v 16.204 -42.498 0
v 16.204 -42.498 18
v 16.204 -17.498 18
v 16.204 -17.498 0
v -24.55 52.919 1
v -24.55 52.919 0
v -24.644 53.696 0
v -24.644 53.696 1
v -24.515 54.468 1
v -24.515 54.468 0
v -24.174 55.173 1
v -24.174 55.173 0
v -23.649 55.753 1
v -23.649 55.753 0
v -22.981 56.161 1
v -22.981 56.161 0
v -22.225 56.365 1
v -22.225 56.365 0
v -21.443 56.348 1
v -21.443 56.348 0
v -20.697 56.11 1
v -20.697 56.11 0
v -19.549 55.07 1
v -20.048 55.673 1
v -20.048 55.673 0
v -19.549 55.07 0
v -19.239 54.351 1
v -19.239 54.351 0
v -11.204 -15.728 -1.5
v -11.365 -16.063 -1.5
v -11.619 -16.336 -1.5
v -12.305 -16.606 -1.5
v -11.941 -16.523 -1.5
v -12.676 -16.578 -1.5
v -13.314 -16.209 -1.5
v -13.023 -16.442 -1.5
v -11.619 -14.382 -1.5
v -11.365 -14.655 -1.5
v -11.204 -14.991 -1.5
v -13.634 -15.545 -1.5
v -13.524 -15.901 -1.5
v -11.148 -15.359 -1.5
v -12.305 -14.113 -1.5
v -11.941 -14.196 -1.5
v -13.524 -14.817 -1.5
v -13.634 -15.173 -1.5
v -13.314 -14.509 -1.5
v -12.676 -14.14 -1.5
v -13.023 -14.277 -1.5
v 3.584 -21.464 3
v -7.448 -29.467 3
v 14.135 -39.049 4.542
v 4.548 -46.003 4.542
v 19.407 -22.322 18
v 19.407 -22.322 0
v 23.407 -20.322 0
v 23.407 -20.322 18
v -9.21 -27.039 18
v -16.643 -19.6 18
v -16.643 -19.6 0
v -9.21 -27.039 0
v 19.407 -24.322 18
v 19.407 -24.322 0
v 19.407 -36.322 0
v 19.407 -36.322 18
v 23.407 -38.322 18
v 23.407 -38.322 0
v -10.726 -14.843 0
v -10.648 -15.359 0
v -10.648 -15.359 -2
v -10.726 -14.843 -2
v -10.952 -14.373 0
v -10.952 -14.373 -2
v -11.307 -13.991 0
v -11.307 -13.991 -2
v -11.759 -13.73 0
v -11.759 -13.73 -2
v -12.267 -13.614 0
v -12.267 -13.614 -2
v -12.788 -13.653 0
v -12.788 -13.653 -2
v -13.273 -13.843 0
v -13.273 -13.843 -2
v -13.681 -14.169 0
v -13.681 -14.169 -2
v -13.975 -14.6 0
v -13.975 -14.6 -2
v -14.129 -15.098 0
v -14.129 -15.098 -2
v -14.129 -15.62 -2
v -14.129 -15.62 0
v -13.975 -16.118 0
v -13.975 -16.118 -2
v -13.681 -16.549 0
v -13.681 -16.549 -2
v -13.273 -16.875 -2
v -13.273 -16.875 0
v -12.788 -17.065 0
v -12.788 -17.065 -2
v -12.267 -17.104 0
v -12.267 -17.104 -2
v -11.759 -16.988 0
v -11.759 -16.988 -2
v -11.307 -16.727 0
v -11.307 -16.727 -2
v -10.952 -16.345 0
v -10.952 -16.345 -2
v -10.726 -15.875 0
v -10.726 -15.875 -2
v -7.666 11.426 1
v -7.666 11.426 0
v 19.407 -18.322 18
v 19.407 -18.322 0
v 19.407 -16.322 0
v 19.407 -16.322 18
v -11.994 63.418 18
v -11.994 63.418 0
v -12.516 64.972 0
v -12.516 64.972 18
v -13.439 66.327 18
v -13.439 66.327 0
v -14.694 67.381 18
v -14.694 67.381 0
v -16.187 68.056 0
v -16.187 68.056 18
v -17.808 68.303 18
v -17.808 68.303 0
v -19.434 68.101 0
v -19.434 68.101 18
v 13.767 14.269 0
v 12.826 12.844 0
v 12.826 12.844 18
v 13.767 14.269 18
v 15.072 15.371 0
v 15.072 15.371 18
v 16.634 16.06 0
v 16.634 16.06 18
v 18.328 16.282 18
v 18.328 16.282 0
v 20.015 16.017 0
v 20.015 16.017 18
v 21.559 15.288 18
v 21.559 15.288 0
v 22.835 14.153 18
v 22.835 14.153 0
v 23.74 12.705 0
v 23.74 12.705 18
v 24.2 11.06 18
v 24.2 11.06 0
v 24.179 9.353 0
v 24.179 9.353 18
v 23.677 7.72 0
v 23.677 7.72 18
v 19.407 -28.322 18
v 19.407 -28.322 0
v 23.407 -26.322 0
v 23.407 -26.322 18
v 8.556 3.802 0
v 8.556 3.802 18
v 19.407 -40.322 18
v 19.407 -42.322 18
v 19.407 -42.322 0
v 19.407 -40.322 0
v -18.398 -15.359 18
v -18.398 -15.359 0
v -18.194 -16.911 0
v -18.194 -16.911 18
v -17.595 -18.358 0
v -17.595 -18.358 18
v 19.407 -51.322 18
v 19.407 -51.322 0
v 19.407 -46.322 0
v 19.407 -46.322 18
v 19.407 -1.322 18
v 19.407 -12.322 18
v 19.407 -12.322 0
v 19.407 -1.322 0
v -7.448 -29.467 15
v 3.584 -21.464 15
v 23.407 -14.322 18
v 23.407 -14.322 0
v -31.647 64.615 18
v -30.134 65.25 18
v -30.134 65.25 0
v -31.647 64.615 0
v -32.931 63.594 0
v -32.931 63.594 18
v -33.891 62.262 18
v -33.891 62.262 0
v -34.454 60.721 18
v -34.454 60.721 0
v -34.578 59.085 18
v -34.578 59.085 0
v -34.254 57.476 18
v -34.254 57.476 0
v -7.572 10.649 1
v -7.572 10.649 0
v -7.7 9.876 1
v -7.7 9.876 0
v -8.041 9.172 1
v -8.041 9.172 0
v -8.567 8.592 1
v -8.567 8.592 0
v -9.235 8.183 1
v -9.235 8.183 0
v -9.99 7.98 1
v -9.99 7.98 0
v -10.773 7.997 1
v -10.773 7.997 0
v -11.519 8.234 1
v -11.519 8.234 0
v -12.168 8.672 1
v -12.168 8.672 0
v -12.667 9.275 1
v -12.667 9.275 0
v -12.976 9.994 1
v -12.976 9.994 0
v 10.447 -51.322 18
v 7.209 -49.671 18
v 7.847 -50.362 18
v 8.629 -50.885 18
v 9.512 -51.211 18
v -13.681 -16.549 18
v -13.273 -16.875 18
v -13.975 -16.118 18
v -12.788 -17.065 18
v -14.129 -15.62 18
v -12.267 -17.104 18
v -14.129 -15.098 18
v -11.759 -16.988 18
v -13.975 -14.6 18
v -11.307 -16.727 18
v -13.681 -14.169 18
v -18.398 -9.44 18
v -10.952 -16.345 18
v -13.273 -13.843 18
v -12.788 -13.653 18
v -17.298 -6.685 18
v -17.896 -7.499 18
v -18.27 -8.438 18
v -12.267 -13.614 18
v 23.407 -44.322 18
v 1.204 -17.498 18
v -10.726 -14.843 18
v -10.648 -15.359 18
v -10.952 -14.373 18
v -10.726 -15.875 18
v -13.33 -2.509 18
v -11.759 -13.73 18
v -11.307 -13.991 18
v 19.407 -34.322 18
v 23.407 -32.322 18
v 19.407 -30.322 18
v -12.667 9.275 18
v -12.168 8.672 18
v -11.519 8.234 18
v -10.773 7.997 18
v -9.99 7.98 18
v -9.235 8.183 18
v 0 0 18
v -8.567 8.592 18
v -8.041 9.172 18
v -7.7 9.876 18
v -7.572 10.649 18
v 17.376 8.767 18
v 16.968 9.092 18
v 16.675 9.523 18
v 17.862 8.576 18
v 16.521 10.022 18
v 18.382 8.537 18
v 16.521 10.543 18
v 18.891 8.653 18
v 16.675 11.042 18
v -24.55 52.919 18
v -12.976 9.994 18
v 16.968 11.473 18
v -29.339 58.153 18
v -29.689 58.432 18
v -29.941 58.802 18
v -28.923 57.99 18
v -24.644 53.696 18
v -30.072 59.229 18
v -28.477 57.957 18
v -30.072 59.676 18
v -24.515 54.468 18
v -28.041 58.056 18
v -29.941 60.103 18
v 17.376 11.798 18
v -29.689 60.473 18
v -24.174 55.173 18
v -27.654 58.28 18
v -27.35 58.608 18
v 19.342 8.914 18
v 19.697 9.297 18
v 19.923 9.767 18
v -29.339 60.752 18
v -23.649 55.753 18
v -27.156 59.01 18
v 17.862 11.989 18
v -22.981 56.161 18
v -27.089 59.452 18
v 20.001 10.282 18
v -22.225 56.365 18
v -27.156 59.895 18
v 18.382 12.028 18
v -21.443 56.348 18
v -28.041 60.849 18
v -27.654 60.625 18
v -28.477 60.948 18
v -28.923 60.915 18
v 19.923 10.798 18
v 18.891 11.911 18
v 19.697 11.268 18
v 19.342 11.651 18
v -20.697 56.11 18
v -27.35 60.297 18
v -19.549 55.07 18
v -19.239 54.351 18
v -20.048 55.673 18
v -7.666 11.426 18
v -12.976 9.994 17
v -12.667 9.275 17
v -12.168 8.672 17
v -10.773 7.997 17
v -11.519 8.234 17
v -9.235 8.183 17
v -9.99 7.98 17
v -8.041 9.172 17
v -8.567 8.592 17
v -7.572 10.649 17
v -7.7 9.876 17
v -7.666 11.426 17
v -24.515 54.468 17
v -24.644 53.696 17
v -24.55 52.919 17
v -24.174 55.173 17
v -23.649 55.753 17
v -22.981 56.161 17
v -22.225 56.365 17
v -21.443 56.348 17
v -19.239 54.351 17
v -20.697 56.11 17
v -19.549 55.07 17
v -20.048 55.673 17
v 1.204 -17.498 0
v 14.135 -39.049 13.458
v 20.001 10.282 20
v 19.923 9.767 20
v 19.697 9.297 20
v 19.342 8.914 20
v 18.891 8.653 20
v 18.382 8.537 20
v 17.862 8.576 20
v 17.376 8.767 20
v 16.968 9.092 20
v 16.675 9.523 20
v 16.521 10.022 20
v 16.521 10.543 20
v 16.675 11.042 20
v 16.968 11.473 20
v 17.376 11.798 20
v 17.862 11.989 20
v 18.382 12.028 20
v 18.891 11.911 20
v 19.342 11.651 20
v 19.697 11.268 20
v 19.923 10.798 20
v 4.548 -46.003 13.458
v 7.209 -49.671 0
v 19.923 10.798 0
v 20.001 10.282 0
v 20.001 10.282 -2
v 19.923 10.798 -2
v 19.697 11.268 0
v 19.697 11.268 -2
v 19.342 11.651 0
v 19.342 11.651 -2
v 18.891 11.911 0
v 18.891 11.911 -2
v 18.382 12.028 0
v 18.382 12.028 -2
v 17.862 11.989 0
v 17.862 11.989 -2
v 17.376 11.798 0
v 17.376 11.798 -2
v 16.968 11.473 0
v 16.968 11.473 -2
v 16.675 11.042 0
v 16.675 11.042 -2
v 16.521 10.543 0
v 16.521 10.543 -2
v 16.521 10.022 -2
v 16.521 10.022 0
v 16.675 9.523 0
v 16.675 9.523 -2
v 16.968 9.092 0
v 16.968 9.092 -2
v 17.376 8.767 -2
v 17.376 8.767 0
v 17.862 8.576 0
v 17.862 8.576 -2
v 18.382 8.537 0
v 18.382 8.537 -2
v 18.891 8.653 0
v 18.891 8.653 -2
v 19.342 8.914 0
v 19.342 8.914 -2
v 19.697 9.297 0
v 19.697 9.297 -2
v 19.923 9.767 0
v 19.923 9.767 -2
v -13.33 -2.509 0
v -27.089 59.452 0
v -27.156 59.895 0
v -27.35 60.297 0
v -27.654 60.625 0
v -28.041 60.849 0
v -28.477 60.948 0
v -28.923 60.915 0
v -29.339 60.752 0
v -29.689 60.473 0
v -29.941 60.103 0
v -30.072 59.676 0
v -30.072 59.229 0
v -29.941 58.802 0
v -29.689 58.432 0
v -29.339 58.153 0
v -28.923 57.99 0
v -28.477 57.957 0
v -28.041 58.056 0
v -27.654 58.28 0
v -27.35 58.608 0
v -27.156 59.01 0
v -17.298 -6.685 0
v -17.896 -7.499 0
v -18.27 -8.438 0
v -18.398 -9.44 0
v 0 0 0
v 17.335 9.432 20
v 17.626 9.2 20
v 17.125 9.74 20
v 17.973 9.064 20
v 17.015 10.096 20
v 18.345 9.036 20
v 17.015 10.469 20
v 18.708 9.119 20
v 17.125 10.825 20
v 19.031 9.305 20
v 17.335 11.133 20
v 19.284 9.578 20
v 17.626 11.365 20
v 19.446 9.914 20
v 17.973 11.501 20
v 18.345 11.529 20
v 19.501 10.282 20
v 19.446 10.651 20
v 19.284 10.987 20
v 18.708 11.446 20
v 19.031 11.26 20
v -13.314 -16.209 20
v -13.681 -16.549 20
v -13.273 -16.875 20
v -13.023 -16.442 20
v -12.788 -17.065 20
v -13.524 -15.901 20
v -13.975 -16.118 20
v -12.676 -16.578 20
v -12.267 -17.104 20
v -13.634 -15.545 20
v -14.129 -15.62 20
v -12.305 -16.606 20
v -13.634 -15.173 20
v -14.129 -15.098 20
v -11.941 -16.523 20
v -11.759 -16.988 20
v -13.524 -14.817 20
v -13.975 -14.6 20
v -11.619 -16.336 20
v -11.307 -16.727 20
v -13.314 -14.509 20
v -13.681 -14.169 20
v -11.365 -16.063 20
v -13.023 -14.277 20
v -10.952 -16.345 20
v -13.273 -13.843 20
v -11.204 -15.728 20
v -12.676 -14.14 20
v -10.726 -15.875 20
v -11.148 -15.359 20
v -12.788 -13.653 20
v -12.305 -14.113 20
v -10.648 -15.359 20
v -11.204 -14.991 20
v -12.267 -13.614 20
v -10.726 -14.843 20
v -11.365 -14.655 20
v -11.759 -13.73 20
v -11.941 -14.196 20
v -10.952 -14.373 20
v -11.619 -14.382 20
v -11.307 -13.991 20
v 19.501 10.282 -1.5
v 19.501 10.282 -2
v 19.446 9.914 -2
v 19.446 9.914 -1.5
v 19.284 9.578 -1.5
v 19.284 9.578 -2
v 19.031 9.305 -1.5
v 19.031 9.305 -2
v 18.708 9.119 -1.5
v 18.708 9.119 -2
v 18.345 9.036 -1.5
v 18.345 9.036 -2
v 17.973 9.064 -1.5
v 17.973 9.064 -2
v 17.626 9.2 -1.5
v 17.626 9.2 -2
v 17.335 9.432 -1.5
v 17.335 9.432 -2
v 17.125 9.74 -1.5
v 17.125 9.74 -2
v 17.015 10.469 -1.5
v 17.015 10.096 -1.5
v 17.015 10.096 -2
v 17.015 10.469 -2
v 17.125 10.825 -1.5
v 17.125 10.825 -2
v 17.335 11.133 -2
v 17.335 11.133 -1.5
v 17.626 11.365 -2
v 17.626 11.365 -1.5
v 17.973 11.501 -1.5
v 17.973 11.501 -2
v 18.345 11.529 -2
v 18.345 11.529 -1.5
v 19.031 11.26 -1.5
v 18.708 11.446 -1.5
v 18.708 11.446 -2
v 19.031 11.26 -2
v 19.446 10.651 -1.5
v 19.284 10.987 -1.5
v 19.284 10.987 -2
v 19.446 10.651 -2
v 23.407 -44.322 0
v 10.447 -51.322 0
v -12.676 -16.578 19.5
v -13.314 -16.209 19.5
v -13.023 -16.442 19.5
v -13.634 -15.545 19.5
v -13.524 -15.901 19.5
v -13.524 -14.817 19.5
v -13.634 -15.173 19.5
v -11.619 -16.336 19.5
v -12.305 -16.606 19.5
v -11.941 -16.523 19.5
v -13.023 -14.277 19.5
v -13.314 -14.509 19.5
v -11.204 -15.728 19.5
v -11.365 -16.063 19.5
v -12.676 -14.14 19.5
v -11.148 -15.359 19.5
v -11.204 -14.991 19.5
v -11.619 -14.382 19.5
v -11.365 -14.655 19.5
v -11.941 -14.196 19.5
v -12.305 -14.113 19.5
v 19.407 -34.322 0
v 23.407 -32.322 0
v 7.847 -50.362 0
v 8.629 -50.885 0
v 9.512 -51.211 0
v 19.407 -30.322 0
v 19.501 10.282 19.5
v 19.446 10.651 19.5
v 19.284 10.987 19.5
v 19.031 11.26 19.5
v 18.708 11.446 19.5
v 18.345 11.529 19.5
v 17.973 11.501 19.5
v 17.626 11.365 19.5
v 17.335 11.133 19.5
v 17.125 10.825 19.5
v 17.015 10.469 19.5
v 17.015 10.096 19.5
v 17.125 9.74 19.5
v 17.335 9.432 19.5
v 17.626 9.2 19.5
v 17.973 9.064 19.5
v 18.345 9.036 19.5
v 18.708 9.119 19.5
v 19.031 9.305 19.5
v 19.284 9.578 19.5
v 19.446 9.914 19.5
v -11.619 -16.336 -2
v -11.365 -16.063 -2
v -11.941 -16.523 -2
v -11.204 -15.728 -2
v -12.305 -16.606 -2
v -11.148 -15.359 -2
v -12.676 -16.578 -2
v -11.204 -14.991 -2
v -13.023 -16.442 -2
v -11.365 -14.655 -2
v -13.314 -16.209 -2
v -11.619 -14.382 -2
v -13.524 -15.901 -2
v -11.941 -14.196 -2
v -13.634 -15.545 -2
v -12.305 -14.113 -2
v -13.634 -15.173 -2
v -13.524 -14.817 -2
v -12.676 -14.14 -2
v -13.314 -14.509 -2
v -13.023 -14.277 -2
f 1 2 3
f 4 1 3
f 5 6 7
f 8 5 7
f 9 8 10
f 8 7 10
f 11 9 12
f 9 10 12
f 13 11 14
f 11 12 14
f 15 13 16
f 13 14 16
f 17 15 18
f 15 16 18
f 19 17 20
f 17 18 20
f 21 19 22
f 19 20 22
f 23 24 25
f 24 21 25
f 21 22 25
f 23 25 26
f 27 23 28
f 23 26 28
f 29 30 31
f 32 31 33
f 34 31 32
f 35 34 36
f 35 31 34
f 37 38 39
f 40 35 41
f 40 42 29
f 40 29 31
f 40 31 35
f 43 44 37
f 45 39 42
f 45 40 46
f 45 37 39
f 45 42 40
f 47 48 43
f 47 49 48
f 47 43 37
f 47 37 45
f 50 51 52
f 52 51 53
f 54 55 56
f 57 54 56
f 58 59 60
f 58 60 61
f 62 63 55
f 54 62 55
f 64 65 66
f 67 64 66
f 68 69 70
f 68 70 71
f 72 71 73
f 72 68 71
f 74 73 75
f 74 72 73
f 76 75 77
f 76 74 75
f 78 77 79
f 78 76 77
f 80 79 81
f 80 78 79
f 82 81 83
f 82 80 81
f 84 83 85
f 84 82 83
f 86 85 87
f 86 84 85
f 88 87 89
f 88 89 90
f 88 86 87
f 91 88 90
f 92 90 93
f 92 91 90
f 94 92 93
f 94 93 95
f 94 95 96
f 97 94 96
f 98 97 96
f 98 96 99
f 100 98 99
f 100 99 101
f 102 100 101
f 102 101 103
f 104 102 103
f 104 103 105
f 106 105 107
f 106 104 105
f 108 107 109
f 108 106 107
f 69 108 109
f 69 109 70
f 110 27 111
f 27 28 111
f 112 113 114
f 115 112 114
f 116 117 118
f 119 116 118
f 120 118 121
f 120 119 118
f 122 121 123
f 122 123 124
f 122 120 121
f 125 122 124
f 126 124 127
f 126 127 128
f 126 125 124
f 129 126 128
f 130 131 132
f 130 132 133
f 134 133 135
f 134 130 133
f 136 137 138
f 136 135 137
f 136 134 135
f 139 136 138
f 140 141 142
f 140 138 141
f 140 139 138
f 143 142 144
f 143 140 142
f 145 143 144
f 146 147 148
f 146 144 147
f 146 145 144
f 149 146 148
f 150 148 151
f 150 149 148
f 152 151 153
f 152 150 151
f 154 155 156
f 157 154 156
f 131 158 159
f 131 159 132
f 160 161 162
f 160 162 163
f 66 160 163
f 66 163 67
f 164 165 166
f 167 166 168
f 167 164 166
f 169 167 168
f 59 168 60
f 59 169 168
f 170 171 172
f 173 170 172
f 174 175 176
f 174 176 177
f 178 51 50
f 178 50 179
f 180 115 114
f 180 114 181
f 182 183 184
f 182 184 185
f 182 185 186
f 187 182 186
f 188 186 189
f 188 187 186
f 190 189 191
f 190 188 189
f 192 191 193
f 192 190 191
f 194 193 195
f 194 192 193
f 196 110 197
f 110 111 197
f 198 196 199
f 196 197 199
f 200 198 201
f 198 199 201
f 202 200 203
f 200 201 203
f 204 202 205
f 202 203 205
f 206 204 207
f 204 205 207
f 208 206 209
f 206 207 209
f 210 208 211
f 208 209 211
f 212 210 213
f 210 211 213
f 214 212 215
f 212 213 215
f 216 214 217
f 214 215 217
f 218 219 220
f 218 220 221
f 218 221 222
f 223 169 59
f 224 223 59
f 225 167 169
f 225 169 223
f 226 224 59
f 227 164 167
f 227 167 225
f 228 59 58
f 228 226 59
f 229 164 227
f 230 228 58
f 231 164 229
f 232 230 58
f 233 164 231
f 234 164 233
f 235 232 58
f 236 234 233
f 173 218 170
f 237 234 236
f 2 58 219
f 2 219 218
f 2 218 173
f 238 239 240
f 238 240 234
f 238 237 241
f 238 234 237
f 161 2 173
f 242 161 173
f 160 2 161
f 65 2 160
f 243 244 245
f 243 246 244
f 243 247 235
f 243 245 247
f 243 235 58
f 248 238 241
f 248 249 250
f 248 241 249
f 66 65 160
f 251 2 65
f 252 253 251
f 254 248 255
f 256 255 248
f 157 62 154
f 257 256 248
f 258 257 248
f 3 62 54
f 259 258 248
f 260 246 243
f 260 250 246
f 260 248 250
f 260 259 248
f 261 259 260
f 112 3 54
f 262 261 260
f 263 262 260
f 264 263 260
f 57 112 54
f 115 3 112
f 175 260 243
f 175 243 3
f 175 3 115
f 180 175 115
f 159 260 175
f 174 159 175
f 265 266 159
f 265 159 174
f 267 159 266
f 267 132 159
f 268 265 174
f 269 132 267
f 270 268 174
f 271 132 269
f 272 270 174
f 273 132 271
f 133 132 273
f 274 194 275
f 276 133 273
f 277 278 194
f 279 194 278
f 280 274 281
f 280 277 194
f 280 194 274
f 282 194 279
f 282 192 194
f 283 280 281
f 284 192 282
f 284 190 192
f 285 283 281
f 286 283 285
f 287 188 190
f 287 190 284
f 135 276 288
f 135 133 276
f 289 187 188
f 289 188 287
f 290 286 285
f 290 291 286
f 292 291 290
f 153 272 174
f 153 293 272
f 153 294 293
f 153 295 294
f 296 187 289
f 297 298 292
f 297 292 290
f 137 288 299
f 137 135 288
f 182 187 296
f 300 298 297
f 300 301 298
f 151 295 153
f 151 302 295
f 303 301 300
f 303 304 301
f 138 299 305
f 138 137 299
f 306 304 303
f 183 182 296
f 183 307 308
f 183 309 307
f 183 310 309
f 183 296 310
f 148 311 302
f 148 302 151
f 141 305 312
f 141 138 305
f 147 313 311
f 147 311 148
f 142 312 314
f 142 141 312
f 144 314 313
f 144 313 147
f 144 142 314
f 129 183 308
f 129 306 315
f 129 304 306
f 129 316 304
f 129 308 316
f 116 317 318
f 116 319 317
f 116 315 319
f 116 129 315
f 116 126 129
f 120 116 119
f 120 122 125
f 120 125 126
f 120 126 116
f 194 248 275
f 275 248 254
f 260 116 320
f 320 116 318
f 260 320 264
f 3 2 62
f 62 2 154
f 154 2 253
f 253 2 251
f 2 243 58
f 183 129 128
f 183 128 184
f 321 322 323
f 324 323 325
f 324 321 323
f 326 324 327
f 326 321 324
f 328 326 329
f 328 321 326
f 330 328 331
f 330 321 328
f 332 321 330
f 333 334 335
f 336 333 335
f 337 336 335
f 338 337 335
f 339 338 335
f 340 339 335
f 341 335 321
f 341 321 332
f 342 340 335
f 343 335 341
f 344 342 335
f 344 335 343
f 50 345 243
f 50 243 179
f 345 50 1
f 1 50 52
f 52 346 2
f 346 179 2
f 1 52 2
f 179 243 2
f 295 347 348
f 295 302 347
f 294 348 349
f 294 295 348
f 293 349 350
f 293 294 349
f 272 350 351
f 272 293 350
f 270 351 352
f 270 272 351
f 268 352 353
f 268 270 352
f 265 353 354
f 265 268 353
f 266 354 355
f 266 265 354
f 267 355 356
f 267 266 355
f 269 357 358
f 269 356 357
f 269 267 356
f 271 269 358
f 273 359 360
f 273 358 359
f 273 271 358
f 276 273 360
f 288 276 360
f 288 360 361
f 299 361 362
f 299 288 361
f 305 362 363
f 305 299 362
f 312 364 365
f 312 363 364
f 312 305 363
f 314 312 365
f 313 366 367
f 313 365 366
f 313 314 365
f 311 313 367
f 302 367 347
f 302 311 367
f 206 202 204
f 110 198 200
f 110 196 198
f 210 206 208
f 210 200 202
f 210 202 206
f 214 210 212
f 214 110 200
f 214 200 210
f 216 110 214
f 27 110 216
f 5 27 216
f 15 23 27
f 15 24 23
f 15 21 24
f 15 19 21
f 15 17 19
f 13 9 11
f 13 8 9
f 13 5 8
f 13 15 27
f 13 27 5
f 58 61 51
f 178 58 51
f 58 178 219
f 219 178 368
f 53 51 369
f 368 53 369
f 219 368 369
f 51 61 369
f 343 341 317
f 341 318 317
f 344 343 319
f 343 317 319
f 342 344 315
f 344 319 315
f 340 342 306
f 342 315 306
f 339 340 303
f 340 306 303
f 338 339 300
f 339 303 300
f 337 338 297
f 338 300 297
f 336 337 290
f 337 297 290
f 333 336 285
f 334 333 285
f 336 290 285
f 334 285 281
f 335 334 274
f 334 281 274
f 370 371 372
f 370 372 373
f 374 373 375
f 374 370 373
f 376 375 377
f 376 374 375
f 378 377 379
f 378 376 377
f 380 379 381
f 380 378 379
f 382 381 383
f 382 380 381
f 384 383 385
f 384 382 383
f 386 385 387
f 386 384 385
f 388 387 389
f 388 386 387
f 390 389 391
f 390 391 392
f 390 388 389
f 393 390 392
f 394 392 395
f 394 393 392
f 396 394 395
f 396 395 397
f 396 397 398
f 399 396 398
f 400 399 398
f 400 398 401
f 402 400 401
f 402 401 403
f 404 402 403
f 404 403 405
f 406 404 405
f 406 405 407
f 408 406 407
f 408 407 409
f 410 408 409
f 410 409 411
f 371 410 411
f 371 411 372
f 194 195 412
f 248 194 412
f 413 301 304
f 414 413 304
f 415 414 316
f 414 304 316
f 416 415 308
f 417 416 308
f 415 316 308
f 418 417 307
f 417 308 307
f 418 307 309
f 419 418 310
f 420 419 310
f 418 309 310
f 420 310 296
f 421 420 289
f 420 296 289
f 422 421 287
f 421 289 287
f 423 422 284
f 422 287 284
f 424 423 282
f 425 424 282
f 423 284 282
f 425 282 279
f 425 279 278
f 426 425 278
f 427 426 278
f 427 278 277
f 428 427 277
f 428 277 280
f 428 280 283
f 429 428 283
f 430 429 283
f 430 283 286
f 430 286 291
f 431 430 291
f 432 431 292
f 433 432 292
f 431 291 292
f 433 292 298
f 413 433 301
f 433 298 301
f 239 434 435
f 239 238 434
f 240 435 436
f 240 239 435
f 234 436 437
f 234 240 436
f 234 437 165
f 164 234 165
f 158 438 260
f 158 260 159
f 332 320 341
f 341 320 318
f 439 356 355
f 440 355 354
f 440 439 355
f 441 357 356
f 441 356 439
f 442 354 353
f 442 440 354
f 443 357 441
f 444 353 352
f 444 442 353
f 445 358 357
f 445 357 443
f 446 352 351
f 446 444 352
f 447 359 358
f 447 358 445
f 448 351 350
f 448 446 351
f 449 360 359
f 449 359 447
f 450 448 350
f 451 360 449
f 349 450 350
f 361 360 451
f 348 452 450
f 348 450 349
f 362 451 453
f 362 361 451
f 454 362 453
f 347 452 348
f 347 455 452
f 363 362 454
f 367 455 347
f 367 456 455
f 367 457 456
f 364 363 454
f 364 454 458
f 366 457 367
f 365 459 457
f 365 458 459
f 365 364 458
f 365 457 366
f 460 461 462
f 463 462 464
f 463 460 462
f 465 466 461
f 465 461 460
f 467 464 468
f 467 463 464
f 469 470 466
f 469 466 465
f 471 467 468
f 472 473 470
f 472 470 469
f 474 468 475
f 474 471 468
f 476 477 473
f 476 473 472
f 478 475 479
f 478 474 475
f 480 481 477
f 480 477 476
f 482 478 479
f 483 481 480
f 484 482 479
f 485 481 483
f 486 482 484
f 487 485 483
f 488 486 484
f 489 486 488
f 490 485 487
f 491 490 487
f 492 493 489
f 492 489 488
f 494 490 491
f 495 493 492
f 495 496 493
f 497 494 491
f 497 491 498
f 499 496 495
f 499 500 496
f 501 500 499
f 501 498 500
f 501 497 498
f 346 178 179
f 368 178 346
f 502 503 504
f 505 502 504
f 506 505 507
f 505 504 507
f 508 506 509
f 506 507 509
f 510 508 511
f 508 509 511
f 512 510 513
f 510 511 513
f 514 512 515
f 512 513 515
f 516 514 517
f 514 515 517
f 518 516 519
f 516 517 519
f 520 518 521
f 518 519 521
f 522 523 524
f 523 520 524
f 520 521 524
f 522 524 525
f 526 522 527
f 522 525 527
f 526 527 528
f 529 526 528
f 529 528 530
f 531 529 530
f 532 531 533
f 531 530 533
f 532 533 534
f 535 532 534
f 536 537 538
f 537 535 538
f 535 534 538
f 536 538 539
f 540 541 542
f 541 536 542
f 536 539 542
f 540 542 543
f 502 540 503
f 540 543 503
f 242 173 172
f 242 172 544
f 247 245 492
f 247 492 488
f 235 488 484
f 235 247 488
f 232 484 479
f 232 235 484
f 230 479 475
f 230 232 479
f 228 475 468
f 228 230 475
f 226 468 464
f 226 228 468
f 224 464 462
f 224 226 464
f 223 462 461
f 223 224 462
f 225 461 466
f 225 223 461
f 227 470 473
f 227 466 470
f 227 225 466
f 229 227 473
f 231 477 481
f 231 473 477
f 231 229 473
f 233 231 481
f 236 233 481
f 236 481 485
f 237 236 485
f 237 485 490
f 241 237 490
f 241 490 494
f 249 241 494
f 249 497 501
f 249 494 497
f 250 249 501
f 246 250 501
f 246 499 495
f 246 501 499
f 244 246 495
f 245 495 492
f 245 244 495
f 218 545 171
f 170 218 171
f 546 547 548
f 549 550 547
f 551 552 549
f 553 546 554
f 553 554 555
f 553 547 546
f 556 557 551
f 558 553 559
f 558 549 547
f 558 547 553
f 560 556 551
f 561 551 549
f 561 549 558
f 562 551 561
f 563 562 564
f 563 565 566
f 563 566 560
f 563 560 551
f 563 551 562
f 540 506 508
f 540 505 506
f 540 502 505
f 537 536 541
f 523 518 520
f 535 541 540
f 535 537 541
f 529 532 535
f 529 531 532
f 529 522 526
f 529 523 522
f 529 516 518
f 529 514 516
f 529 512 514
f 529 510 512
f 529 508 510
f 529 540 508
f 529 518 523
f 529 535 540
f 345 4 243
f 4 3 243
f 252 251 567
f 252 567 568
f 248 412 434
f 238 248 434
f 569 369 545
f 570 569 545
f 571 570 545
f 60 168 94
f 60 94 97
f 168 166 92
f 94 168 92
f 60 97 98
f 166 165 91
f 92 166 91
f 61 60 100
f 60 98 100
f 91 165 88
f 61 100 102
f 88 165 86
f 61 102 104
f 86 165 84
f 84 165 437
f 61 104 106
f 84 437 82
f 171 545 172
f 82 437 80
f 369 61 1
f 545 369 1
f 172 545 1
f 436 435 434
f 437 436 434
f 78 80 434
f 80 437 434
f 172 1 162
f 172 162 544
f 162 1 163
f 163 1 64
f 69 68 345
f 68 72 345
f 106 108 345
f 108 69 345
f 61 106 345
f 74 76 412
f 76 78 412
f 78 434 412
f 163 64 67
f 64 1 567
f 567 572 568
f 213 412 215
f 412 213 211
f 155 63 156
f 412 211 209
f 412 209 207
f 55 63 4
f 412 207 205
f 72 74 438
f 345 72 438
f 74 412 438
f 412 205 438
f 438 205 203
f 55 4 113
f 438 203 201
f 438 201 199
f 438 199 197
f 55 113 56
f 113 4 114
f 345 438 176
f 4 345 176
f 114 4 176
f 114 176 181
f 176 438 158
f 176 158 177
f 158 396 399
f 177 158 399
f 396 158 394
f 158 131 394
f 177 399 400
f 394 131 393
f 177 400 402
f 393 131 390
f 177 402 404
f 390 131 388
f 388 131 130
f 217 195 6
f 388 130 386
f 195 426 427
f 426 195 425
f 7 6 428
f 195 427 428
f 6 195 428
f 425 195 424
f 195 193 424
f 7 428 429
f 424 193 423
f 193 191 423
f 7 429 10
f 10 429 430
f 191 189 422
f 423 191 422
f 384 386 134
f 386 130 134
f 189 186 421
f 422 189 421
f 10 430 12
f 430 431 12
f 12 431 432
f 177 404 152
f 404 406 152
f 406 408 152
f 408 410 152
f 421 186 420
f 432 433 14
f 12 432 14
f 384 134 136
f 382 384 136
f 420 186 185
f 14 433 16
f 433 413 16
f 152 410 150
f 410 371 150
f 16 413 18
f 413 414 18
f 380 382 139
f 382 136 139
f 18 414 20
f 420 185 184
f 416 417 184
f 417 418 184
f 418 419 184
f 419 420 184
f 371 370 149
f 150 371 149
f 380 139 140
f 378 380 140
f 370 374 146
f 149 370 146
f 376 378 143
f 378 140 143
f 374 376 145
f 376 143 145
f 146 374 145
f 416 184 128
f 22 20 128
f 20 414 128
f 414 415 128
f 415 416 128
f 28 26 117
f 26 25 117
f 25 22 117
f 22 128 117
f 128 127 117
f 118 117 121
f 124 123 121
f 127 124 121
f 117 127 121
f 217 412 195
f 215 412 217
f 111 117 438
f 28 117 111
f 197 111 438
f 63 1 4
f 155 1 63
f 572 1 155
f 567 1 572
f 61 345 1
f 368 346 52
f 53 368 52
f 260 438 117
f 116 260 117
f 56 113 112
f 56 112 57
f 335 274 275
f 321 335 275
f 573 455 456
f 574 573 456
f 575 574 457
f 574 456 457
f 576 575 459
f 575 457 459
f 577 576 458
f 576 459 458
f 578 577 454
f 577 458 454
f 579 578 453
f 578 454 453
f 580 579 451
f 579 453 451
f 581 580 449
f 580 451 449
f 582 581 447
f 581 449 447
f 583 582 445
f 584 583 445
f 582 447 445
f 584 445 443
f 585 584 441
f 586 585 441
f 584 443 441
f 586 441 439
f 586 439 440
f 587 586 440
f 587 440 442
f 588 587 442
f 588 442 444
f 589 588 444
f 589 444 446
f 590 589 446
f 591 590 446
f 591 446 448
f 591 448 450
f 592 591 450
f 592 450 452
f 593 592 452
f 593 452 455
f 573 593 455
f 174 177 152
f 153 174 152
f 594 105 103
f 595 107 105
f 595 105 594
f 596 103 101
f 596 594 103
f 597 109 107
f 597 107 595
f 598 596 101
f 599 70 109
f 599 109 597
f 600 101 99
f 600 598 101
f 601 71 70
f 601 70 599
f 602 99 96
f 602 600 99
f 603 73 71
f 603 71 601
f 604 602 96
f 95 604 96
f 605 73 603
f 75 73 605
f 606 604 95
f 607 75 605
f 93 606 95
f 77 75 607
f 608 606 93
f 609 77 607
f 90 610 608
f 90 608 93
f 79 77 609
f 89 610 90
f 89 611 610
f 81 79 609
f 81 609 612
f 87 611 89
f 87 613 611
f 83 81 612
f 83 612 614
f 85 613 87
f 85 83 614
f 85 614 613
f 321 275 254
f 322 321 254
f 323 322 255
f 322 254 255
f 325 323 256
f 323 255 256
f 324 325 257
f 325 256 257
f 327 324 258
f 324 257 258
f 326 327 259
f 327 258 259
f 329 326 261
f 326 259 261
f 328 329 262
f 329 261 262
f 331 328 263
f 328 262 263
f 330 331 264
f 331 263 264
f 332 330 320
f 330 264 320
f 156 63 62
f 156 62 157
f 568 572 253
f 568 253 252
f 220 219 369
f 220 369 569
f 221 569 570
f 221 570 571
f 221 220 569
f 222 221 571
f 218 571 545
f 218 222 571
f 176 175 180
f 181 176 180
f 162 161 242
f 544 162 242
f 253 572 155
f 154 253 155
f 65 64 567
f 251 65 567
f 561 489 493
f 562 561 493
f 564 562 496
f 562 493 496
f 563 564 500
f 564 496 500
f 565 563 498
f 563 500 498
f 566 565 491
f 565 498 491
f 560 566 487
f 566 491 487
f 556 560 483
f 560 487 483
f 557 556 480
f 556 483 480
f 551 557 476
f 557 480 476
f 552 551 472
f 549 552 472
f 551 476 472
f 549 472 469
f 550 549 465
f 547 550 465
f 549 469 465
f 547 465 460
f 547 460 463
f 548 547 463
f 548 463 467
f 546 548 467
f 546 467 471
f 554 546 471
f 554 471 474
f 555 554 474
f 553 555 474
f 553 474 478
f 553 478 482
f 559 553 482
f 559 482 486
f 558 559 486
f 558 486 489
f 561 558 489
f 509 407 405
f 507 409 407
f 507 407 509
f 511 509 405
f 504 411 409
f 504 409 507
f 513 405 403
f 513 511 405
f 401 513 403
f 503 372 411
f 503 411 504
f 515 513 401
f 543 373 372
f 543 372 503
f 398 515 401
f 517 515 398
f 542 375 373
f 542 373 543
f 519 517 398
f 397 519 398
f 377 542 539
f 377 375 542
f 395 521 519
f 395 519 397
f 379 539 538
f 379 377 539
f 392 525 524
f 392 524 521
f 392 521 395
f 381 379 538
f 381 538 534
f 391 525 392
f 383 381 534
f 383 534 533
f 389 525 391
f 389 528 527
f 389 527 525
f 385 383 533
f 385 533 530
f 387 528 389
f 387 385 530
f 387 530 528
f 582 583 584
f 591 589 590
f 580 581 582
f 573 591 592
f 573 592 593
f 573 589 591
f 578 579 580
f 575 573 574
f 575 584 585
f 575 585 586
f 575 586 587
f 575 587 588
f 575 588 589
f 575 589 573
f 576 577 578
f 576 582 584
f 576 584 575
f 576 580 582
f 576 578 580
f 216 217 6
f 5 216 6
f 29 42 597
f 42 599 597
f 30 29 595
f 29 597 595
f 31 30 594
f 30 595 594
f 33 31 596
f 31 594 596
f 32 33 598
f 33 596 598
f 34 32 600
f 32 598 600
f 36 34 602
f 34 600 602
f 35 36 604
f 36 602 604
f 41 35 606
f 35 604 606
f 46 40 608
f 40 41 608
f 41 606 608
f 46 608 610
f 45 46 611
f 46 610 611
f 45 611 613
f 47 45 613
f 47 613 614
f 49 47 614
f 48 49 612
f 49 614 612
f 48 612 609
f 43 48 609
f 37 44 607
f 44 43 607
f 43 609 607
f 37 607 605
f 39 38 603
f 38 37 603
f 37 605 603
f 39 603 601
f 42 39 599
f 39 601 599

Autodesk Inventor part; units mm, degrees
ref_plane "YZ Plane" through (0, 0, 0) normal (1, 0, 0) x (0, 1, 0)
ref_plane "XZ Plane" through (0, 0, 0) normal (0, 1, 0) x (-1, 0, 0)
sketch "Sketch1" plane through (0, 0, 0) normal (0, 0, 1) x (1, 0, 0)
  line L0 (0, 0) -> (-13.1942, 69.7633)
  line L1 (-13.1942, 69.7633) -> (-36.3853, 63.5848)
  line L2 (-36.3853, 63.5848) -> (-13.3296, -2.5093)
  line L3 (-13.3296, -2.5093) -> (-18.3981, -7.8428)
  line L4 (-18.3981, -7.8428) -> (-18.3981, -17.8428)
  line L5 (-18.3981, -17.8428) -> (-9.2098, -27.0392)
  line L6 (-9.2098, -27.0392) -> (8.4067, -51.3221)
  line L7 (8.4067, -51.3221) -> (19.4067, -51.3221)
  line L8 (19.4067, -51.3221) -> (19.4067, -1.3221)
  line L9 (19.4067, -1.3221) -> (23.6767, 7.7205)
  arc A0 (23.6767, 7.7205) -> (12.8256, 12.8444) centre (18.2512, 10.2824) ccw
  line L10 (8.5557, 3.8018) -> (12.8256, 12.8444)
  line L11 (0, 0) -> (8.5557, 3.8018)
  dimension "d0" = 71
  dimension "d1" = 24
  dimension "d2" = 70
  dimension "d3" = 20
  dimension "d4" = 10
  dimension "d5" = 13
  dimension "d6" = 30
  dimension "d8" = 11
  dimension "d9" = 50
  dimension "d10" = 10
  dimension "d11" = 12
  dimension "d12" = 10
extrude "Extrusion1" add sketch "Sketch1" along normal blind 18
sketch "Sketch2" plane through (0, 0, 18) normal (0, 0, 1) x (1, 0, 0)
  line L0 (16.2045, -42.4982) -> (16.2045, -17.4982)
  line L1 (16.2045, -17.4982) -> (1.2045, -17.4982)
  line L2 (1.2045, -17.4982) -> (16.2045, -42.4982)
  point P0 (0, 0)
  dimension "d15" = 25
  dimension "d16" = 15
extrude "Extrusion2" cut sketch "Sketch2" against normal blind 18
sketch "Sketch3" plane through (0, 0, 18) normal (0, 0, 1) x (1, 0, 0)
  line L0 (19.4067, -51.3221) -> (19.4067, -1.3221) construction
  line L1 (19.4067, -51.3221) -> (19.4067, -46.3221) construction
  line L2 (19.4067, -46.3221) -> (19.4067, -42.3221)
  line L3 (19.4067, -44.3221) -> (23.4067, -44.3221) construction
  line L4 (19.4067, -42.3221) -> (23.4067, -44.3221)
  line L5 (19.4067, -46.3221) -> (23.4067, -44.3221)
  point P0 (0, 0)
  dimension "d19" = 5
  dimension "d20" = 4
  dimension "d21" = 4
extrude "Extrusion3" add sketch "Sketch3" against normal blind 18
pattern_linear "Rectangular Pattern1" count 6 spacing 6 along (0, 1, 0) of "Extrusion3"
fillet "Fillet1" radius 6 3 edges at (-18.3981, -17.8428, 9) (-36.3853, 63.5848, 9) (-13.1942, 69.7633, 9)
fillet "Fillet2" radius 4 2 edges at (-18.3981, -7.8428, 9) (8.4067, -51.3221, 9)
sketch "Sketch5" plane through (0, 0, 18) normal (0, 0, 1) x (1, 0, 0)
  arc A0 (-30.1339, 65.2503) -> (-34.2545, 57.4763) centre (-28.5892, 59.4525) ccw projected
  circle A1 centre (-28.5892, 59.4525) radius 1.5
  point P0 (0, 0)
  dimension "d32" = 3
extrude "Extrusion5" cut sketch "Sketch5" against normal blind 18
sketch "Sketch6" plane through (-9.2098, -27.0392, 0) normal (-0.8094, -0.5872, 0) x (0, 0, 1)
  line L0 (3, -3) -> (15, -3)
  line L1 (0, 0) -> (0, -27.9601) projected
  line L2 (18, 0) -> (18, -27.9601) projected
  line L3 (0, 0) -> (18, 0) projected
  line L4 (3, -3) -> (4.5418, -23.4291)
  line L5 (18, -23.4291) -> (0, -23.4291) projected
  line L6 (15, -3) -> (13.4582, -23.4291)
  point P0 (0, 16.4781)
  dimension "d35" = 3
  dimension "d36" = 3
  dimension "d37" = 3
extrude "Extrusion6" cut sketch "Sketch6" against normal blind 14 contours L0 L6 L5 L4
sketch "Sketch7" plane through (0, 0, 18) normal (0, 0, 1) x (1, 0, 0)
  arc A0 (-18.3981, -15.359) -> (-16.6426, -19.5998) centre (-12.3981, -15.359) ccw projected
  circle A1 centre (-12.3981, -15.359) radius 1.75
  arc A2 (23.6767, 7.7205) -> (12.8256, 12.8444) centre (18.2512, 10.2824) ccw projected
  circle A3 centre (18.2512, 10.2824) radius 1.75
  point P0 (0, 0)
  dimension "d40" = 3.5
  dimension "d41" = 3.5
extrude "Extrusion7" add sketch "Sketch7" along normal blind 2
sketch "Sketch9" plane through (18.2512, 10.2824, 20) normal (0, 0, 1) x (1, 0, 0)
  circle A0 centre (0, 0) radius 1.75 projected
  circle A1 centre (-30.6493, -25.6415) radius 1.75 projected
  circle A2 centre (0, 0) radius 1.25
  circle A3 centre (-30.6493, -25.6415) radius 1.25
  point P0 (-18.2512, -10.2824)
  dimension "d44" = 0.5
  dimension "d45" = 0.5
extrude "Extrusion8" cut sketch "Sketch9" against normal blind 0.5 contours A2 | A3
sketch "Sketch10" plane through (0, 0, 18) normal (0, 0, 1) x (1, 0, 0)
  line L0 (-21.8945, 53.635) -> (-10.3211, 10.7097) construction
  line L1 (-24.5497, 52.9192) -> (-12.9763, 9.9938)
  line L2 (-7.6659, 11.4256) -> (-19.2393, 54.3509)
  arc A0 (-19.2393, 54.3509) -> (-24.5497, 52.9192) centre (-21.8945, 53.635) ccw
  arc A1 (-12.9763, 9.9938) -> (-7.6659, 11.4256) centre (-10.3211, 10.7097) ccw
  point P0 (0, 0)
  point P1 (-16.1078, 32.1724)
  dimension "d48" = 5.5
extrude "Extrusion9" cut sketch "Sketch10" against normal blind 1
ref_plane "Work Plane1" through (0, 0, 9) normal (0, 0, 1) x (1, 0, 0)
mirror "Mirror1" about plane through (0, 0, 9) normal (0, 0, 1) of "Extrusion9", "Extrusion7", "Extrusion8"
